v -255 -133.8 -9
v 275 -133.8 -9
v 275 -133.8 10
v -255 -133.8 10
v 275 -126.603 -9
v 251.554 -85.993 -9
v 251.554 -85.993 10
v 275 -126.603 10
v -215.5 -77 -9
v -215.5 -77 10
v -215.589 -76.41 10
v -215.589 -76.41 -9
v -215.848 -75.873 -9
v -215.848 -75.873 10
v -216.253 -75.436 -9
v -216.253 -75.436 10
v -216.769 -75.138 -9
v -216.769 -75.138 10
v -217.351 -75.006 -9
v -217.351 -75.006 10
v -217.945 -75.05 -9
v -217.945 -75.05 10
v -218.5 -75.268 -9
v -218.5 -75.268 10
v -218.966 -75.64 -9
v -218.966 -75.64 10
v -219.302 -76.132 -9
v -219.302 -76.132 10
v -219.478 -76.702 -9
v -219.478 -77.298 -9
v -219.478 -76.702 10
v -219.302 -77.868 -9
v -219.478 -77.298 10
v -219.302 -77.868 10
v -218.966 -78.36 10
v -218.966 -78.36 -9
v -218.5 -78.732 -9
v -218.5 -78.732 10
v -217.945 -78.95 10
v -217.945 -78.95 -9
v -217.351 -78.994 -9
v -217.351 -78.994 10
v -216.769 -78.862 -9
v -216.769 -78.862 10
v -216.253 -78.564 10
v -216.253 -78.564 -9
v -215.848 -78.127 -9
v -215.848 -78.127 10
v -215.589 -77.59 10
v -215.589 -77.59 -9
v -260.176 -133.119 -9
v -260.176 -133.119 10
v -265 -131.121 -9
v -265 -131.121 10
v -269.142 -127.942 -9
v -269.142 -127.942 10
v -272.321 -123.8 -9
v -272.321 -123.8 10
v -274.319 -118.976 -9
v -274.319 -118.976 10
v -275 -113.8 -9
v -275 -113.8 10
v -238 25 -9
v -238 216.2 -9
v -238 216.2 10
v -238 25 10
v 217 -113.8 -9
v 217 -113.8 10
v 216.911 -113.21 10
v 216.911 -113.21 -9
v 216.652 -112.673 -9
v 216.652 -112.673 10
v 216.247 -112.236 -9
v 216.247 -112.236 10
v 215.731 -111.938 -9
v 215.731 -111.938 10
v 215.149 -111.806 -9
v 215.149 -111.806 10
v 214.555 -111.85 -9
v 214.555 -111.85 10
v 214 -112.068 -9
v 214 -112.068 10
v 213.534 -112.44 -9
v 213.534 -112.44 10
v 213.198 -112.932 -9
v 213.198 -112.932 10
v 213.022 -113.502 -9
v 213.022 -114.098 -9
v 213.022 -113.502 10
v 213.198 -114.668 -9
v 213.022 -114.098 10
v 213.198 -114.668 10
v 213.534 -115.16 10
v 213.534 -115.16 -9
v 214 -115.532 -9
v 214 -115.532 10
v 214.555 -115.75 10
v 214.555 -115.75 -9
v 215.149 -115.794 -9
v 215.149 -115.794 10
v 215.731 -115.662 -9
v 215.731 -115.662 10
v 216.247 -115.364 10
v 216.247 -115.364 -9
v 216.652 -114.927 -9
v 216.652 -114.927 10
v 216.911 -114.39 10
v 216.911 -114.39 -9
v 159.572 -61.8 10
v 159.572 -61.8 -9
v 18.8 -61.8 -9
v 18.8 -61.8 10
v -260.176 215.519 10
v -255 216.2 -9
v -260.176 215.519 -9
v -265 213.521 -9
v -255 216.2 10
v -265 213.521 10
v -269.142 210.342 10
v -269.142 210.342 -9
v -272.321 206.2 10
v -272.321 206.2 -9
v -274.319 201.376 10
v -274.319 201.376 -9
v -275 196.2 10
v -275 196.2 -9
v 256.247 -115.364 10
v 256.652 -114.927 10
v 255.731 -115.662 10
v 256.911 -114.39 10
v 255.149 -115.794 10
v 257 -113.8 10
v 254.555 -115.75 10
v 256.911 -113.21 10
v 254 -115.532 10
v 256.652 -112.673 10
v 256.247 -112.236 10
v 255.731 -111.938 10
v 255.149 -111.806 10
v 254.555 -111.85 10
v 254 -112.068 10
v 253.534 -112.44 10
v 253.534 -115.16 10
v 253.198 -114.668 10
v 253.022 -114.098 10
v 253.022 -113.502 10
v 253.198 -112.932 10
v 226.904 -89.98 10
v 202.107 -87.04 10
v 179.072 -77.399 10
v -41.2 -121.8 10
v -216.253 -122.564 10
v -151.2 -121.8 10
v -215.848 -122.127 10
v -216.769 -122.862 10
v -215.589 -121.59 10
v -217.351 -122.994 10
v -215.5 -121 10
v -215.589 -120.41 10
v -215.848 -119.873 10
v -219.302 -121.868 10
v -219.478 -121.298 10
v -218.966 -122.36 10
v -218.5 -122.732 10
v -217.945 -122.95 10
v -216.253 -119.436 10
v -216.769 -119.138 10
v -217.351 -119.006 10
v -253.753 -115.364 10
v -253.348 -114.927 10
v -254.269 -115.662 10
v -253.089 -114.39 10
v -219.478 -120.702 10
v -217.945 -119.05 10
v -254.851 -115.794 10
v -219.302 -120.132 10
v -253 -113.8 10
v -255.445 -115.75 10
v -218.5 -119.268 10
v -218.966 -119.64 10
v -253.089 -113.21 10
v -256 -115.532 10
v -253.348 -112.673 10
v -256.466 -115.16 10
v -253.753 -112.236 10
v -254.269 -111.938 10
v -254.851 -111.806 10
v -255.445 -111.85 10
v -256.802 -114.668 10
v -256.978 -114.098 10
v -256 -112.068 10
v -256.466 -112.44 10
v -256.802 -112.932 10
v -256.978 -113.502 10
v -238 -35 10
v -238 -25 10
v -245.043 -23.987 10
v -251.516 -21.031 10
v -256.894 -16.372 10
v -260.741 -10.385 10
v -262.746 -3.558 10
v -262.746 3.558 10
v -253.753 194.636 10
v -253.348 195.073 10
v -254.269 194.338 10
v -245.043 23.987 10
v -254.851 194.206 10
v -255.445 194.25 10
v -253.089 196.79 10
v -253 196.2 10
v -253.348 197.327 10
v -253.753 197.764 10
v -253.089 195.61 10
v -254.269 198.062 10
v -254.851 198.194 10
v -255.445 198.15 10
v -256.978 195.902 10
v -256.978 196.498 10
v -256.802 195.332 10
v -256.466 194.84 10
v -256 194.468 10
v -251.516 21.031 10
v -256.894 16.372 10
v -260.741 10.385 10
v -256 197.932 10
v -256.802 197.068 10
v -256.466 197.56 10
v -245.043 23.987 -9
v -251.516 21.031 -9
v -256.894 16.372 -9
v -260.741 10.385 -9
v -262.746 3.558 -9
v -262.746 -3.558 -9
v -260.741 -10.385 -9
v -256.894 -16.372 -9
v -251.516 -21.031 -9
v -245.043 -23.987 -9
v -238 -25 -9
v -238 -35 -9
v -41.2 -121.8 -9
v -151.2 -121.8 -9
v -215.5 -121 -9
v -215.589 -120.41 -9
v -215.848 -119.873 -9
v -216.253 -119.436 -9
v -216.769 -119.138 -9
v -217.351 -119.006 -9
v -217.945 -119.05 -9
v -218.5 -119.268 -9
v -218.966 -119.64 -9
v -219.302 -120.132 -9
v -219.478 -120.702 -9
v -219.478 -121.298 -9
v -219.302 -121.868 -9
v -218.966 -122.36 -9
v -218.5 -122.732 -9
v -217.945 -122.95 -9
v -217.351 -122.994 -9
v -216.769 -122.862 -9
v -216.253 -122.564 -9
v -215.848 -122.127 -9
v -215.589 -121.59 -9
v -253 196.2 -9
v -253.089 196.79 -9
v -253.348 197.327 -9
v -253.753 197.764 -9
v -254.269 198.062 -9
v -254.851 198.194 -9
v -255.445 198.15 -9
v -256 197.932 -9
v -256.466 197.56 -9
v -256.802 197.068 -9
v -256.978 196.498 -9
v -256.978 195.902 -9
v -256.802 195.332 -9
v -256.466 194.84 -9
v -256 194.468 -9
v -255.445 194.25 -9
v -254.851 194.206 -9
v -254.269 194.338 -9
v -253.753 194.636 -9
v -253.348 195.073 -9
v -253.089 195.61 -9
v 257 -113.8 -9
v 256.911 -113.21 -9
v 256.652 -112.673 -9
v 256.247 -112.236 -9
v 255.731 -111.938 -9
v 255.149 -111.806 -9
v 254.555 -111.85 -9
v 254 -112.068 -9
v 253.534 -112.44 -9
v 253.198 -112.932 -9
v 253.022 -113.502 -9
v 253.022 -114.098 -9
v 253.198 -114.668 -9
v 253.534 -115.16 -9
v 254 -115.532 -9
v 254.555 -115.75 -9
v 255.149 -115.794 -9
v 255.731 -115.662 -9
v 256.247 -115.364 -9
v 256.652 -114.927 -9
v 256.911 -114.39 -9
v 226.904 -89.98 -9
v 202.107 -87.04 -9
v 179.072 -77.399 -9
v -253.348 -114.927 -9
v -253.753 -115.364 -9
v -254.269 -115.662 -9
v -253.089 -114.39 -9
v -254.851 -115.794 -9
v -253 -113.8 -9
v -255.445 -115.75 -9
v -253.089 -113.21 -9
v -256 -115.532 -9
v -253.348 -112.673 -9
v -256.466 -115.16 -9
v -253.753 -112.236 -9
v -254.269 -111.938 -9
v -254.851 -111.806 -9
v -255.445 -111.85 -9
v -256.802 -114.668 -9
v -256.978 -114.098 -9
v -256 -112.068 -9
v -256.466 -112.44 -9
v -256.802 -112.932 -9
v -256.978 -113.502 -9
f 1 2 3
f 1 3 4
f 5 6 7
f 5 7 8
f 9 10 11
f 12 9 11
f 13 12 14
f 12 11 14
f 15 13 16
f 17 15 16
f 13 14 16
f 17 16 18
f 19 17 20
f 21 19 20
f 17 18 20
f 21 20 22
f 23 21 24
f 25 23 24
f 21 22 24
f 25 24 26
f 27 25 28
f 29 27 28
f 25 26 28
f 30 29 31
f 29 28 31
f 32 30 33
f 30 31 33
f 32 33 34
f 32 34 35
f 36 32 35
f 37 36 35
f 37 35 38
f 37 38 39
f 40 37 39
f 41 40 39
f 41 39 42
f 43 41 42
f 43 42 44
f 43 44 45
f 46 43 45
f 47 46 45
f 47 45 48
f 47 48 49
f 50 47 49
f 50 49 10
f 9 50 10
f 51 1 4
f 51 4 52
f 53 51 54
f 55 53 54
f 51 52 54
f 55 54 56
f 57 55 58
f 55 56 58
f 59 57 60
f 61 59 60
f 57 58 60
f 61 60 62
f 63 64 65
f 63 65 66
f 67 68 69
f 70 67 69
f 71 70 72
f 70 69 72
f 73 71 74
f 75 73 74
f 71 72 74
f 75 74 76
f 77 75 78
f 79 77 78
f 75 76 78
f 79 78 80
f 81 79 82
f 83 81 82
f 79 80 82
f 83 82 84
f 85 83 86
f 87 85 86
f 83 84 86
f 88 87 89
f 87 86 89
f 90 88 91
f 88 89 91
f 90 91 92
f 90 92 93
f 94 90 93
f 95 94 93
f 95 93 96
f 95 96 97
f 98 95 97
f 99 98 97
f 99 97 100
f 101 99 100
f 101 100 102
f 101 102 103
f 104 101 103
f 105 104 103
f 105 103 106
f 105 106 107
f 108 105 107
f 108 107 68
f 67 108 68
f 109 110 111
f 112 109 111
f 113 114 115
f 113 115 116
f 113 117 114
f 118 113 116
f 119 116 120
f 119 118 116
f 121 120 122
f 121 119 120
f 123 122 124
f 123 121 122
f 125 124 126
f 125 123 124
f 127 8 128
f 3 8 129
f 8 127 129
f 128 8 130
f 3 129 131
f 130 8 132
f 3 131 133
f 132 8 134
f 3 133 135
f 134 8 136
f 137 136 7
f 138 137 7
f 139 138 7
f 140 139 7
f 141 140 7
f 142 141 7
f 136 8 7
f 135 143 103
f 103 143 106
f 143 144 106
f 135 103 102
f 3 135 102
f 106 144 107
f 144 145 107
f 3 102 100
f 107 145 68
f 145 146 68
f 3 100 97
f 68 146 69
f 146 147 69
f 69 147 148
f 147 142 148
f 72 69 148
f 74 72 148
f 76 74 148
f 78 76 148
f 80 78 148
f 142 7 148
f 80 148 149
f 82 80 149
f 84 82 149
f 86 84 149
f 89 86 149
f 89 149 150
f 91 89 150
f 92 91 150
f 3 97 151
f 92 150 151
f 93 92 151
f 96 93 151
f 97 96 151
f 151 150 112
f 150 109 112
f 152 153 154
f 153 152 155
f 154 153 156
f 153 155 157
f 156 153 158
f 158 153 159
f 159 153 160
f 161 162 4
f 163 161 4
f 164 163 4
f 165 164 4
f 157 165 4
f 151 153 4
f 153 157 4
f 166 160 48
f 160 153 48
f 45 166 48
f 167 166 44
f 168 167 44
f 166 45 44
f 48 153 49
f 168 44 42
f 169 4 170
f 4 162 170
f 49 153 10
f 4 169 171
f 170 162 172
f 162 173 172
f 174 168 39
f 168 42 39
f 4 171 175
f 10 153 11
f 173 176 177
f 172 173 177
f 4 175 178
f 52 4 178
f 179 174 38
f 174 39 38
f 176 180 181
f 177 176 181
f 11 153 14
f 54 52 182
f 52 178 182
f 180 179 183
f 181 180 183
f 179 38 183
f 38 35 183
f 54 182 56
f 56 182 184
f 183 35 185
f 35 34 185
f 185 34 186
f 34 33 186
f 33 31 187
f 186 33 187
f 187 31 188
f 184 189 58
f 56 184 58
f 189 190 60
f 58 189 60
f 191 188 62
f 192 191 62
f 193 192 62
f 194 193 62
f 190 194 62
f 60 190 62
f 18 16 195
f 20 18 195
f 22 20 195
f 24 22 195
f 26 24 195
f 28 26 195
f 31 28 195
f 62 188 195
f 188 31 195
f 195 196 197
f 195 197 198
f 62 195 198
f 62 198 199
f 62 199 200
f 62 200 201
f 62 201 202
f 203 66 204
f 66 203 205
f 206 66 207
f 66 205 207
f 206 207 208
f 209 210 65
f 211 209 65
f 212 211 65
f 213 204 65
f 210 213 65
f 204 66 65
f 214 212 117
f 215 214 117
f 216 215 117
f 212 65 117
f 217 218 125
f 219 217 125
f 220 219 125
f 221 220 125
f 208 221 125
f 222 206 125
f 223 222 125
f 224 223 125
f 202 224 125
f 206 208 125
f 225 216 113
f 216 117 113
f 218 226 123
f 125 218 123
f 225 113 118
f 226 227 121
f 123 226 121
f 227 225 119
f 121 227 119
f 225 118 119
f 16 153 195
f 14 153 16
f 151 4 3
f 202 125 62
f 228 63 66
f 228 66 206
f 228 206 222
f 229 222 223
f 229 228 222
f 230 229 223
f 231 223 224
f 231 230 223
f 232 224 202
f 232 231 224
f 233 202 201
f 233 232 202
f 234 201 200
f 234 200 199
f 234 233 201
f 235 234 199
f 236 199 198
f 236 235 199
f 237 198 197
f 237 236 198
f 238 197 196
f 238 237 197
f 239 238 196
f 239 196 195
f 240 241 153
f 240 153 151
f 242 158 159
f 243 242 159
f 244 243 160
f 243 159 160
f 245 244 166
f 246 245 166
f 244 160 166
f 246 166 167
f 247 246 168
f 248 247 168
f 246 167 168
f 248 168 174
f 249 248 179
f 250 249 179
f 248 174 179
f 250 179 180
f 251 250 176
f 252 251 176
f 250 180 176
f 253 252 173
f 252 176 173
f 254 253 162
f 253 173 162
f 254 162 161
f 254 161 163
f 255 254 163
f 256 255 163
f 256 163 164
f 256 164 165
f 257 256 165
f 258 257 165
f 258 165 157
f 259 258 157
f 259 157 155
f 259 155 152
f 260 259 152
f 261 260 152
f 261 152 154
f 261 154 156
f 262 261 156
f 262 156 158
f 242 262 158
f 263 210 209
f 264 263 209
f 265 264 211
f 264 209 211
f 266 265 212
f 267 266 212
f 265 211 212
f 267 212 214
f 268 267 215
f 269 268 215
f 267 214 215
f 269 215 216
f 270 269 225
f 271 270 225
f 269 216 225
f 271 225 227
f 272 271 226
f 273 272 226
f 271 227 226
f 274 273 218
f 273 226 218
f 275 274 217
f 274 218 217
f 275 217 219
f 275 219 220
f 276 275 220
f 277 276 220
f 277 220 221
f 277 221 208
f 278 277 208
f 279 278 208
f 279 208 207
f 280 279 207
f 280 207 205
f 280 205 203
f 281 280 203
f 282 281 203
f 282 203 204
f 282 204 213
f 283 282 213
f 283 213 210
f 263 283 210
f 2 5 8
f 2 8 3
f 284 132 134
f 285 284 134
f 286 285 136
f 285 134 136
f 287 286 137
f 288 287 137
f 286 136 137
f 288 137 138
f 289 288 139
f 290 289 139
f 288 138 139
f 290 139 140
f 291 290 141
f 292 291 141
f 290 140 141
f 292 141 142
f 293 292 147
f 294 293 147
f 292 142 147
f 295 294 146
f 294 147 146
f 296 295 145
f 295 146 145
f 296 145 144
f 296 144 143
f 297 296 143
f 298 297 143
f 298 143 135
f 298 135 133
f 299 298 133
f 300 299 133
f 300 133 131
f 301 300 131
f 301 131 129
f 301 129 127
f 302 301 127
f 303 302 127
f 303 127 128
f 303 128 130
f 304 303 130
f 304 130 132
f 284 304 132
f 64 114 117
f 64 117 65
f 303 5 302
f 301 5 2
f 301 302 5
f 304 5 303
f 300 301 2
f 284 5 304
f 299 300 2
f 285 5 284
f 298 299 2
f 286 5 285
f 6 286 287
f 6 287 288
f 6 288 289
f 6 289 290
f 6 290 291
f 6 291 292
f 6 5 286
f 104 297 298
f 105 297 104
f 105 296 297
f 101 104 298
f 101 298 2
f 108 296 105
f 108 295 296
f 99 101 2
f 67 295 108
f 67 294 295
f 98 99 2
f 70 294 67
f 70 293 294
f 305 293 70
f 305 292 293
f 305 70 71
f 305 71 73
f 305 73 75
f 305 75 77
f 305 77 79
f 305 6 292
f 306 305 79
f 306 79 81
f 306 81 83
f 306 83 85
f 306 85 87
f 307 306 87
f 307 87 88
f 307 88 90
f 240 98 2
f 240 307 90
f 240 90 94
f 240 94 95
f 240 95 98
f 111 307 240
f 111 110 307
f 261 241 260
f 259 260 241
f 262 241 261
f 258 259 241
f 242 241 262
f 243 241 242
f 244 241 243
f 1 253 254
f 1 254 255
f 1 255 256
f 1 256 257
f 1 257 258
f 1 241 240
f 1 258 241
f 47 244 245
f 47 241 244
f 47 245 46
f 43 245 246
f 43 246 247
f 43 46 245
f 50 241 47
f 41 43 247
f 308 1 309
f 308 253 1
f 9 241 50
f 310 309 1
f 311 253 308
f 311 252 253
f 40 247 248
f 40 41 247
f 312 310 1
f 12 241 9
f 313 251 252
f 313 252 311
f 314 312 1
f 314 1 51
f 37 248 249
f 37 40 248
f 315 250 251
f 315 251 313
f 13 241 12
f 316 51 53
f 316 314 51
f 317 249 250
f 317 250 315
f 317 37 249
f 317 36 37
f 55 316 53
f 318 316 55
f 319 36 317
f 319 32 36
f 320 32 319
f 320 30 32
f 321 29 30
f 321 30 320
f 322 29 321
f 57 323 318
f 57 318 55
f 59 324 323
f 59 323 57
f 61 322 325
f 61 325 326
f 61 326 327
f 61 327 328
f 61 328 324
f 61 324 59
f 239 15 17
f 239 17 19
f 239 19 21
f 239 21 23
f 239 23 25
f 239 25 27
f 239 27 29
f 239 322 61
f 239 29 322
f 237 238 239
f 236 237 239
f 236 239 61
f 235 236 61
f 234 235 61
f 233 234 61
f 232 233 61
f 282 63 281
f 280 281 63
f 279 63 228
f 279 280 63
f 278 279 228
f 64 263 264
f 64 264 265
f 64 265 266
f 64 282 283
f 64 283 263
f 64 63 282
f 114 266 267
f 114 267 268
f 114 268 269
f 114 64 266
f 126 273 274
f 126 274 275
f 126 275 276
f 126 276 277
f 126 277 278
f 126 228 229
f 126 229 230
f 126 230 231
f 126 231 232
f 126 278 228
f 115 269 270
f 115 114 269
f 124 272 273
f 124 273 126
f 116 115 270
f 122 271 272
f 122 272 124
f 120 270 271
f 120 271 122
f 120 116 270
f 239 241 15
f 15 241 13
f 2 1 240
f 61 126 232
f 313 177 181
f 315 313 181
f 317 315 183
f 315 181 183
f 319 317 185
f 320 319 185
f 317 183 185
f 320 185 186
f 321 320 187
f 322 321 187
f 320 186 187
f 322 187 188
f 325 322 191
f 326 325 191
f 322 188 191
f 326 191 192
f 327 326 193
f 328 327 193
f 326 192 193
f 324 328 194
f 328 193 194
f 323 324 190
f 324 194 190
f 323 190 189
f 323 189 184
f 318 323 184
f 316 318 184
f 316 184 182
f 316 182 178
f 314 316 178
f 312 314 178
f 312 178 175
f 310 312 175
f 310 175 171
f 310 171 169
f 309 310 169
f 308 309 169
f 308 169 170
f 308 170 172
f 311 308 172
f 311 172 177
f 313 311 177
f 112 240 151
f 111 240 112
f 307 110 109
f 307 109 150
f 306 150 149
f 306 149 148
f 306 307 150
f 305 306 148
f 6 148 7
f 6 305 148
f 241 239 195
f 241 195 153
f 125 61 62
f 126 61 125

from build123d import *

# Parameters (mm, degrees)
PAD013_DEPTH    = 19
FILLET001_R     = 20
SKETCH022_R     = 2
POCKET013_DEPTH = 19.001
SKETCH027_R     = 2
POCKET017_DEPTH = 19.001
SKETCH069_R     = 2
POCKET044_DEPTH = 19.001


with BuildPart() as part:
    # Sketch015 → Pad013 (new body)
    with BuildSketch(Plane.XY):
        with BuildLine():
            Line((-275, 216.2), (-238, 216.2))
            Line((-238, 216.2), (-238, 25))
            ThreePointArc((-238, 25), (-263, 0), (-238, -25))
            Line((-238, -25), (-238, -35))
            Line((-238, -35), (-151.2, -121.8))
            Line((-151.2, -121.8), (-41.2, -121.8))
            Line((-41.2, -121.8), (18.8, -61.8))
            Line((159.572483, -61.8), (18.8, -61.8))
            ThreePointArc((159.572483, -61.8), (202.10651, -87.039578), (251.554314, -85.993421))
            Line((251.554314, -85.993421), (275, -126.60254))
            Line((275, -126.60254), (275, -133.8))
            Line((275, -133.8), (-275, -133.8))
            Line((-275, -133.8), (-275, 216.2))
        make_face()
    extrude(amount=PAD013_DEPTH)

    # Fillet001
    fillet001_edges = [part.edges().sort_by_distance(p)[0] for p in [
        (-275, 216.2, 9.5),
        (-275, -133.8, 9.5),
    ]]
    fillet(fillet001_edges, radius=FILLET001_R)

    # Sketch022 (on Face5 of Fillet001) → Pocket013 (cut, through all)
    with BuildSketch(Plane.XY.offset(19)):
        with Locations((-255, 196.2)):
            Circle(SKETCH022_R)
        with Locations((-255, -113.8)):
            Circle(SKETCH022_R)
        with Locations((215, -113.8)):
            Circle(SKETCH022_R)
    extrude(amount=-POCKET013_DEPTH, mode=Mode.SUBTRACT)

    # Sketch027 (on Face5 of Pocket013) → Pocket017 (cut, through all)
    with BuildSketch(Plane.XY.offset(19)):
        with Locations((255, -113.8)):
            Circle(SKETCH027_R)
    extrude(amount=-POCKET017_DEPTH, mode=Mode.SUBTRACT)

    # Sketch069 (on Face5 of Pocket017) → Pocket044 (cut, through all)
    with BuildSketch(Plane.XY.offset(19)):
        with Locations((-217.5, -77)):
            Circle(SKETCH069_R)
        with Locations((-217.5, -121)):
            Circle(SKETCH069_R)
    extrude(amount=-POCKET044_DEPTH, mode=Mode.SUBTRACT)


with BuildPart() as part_1:
    # Body009 placement: moved
    add(part.part.moved(Location((0, 0, -9))))


solid = part_1.part
